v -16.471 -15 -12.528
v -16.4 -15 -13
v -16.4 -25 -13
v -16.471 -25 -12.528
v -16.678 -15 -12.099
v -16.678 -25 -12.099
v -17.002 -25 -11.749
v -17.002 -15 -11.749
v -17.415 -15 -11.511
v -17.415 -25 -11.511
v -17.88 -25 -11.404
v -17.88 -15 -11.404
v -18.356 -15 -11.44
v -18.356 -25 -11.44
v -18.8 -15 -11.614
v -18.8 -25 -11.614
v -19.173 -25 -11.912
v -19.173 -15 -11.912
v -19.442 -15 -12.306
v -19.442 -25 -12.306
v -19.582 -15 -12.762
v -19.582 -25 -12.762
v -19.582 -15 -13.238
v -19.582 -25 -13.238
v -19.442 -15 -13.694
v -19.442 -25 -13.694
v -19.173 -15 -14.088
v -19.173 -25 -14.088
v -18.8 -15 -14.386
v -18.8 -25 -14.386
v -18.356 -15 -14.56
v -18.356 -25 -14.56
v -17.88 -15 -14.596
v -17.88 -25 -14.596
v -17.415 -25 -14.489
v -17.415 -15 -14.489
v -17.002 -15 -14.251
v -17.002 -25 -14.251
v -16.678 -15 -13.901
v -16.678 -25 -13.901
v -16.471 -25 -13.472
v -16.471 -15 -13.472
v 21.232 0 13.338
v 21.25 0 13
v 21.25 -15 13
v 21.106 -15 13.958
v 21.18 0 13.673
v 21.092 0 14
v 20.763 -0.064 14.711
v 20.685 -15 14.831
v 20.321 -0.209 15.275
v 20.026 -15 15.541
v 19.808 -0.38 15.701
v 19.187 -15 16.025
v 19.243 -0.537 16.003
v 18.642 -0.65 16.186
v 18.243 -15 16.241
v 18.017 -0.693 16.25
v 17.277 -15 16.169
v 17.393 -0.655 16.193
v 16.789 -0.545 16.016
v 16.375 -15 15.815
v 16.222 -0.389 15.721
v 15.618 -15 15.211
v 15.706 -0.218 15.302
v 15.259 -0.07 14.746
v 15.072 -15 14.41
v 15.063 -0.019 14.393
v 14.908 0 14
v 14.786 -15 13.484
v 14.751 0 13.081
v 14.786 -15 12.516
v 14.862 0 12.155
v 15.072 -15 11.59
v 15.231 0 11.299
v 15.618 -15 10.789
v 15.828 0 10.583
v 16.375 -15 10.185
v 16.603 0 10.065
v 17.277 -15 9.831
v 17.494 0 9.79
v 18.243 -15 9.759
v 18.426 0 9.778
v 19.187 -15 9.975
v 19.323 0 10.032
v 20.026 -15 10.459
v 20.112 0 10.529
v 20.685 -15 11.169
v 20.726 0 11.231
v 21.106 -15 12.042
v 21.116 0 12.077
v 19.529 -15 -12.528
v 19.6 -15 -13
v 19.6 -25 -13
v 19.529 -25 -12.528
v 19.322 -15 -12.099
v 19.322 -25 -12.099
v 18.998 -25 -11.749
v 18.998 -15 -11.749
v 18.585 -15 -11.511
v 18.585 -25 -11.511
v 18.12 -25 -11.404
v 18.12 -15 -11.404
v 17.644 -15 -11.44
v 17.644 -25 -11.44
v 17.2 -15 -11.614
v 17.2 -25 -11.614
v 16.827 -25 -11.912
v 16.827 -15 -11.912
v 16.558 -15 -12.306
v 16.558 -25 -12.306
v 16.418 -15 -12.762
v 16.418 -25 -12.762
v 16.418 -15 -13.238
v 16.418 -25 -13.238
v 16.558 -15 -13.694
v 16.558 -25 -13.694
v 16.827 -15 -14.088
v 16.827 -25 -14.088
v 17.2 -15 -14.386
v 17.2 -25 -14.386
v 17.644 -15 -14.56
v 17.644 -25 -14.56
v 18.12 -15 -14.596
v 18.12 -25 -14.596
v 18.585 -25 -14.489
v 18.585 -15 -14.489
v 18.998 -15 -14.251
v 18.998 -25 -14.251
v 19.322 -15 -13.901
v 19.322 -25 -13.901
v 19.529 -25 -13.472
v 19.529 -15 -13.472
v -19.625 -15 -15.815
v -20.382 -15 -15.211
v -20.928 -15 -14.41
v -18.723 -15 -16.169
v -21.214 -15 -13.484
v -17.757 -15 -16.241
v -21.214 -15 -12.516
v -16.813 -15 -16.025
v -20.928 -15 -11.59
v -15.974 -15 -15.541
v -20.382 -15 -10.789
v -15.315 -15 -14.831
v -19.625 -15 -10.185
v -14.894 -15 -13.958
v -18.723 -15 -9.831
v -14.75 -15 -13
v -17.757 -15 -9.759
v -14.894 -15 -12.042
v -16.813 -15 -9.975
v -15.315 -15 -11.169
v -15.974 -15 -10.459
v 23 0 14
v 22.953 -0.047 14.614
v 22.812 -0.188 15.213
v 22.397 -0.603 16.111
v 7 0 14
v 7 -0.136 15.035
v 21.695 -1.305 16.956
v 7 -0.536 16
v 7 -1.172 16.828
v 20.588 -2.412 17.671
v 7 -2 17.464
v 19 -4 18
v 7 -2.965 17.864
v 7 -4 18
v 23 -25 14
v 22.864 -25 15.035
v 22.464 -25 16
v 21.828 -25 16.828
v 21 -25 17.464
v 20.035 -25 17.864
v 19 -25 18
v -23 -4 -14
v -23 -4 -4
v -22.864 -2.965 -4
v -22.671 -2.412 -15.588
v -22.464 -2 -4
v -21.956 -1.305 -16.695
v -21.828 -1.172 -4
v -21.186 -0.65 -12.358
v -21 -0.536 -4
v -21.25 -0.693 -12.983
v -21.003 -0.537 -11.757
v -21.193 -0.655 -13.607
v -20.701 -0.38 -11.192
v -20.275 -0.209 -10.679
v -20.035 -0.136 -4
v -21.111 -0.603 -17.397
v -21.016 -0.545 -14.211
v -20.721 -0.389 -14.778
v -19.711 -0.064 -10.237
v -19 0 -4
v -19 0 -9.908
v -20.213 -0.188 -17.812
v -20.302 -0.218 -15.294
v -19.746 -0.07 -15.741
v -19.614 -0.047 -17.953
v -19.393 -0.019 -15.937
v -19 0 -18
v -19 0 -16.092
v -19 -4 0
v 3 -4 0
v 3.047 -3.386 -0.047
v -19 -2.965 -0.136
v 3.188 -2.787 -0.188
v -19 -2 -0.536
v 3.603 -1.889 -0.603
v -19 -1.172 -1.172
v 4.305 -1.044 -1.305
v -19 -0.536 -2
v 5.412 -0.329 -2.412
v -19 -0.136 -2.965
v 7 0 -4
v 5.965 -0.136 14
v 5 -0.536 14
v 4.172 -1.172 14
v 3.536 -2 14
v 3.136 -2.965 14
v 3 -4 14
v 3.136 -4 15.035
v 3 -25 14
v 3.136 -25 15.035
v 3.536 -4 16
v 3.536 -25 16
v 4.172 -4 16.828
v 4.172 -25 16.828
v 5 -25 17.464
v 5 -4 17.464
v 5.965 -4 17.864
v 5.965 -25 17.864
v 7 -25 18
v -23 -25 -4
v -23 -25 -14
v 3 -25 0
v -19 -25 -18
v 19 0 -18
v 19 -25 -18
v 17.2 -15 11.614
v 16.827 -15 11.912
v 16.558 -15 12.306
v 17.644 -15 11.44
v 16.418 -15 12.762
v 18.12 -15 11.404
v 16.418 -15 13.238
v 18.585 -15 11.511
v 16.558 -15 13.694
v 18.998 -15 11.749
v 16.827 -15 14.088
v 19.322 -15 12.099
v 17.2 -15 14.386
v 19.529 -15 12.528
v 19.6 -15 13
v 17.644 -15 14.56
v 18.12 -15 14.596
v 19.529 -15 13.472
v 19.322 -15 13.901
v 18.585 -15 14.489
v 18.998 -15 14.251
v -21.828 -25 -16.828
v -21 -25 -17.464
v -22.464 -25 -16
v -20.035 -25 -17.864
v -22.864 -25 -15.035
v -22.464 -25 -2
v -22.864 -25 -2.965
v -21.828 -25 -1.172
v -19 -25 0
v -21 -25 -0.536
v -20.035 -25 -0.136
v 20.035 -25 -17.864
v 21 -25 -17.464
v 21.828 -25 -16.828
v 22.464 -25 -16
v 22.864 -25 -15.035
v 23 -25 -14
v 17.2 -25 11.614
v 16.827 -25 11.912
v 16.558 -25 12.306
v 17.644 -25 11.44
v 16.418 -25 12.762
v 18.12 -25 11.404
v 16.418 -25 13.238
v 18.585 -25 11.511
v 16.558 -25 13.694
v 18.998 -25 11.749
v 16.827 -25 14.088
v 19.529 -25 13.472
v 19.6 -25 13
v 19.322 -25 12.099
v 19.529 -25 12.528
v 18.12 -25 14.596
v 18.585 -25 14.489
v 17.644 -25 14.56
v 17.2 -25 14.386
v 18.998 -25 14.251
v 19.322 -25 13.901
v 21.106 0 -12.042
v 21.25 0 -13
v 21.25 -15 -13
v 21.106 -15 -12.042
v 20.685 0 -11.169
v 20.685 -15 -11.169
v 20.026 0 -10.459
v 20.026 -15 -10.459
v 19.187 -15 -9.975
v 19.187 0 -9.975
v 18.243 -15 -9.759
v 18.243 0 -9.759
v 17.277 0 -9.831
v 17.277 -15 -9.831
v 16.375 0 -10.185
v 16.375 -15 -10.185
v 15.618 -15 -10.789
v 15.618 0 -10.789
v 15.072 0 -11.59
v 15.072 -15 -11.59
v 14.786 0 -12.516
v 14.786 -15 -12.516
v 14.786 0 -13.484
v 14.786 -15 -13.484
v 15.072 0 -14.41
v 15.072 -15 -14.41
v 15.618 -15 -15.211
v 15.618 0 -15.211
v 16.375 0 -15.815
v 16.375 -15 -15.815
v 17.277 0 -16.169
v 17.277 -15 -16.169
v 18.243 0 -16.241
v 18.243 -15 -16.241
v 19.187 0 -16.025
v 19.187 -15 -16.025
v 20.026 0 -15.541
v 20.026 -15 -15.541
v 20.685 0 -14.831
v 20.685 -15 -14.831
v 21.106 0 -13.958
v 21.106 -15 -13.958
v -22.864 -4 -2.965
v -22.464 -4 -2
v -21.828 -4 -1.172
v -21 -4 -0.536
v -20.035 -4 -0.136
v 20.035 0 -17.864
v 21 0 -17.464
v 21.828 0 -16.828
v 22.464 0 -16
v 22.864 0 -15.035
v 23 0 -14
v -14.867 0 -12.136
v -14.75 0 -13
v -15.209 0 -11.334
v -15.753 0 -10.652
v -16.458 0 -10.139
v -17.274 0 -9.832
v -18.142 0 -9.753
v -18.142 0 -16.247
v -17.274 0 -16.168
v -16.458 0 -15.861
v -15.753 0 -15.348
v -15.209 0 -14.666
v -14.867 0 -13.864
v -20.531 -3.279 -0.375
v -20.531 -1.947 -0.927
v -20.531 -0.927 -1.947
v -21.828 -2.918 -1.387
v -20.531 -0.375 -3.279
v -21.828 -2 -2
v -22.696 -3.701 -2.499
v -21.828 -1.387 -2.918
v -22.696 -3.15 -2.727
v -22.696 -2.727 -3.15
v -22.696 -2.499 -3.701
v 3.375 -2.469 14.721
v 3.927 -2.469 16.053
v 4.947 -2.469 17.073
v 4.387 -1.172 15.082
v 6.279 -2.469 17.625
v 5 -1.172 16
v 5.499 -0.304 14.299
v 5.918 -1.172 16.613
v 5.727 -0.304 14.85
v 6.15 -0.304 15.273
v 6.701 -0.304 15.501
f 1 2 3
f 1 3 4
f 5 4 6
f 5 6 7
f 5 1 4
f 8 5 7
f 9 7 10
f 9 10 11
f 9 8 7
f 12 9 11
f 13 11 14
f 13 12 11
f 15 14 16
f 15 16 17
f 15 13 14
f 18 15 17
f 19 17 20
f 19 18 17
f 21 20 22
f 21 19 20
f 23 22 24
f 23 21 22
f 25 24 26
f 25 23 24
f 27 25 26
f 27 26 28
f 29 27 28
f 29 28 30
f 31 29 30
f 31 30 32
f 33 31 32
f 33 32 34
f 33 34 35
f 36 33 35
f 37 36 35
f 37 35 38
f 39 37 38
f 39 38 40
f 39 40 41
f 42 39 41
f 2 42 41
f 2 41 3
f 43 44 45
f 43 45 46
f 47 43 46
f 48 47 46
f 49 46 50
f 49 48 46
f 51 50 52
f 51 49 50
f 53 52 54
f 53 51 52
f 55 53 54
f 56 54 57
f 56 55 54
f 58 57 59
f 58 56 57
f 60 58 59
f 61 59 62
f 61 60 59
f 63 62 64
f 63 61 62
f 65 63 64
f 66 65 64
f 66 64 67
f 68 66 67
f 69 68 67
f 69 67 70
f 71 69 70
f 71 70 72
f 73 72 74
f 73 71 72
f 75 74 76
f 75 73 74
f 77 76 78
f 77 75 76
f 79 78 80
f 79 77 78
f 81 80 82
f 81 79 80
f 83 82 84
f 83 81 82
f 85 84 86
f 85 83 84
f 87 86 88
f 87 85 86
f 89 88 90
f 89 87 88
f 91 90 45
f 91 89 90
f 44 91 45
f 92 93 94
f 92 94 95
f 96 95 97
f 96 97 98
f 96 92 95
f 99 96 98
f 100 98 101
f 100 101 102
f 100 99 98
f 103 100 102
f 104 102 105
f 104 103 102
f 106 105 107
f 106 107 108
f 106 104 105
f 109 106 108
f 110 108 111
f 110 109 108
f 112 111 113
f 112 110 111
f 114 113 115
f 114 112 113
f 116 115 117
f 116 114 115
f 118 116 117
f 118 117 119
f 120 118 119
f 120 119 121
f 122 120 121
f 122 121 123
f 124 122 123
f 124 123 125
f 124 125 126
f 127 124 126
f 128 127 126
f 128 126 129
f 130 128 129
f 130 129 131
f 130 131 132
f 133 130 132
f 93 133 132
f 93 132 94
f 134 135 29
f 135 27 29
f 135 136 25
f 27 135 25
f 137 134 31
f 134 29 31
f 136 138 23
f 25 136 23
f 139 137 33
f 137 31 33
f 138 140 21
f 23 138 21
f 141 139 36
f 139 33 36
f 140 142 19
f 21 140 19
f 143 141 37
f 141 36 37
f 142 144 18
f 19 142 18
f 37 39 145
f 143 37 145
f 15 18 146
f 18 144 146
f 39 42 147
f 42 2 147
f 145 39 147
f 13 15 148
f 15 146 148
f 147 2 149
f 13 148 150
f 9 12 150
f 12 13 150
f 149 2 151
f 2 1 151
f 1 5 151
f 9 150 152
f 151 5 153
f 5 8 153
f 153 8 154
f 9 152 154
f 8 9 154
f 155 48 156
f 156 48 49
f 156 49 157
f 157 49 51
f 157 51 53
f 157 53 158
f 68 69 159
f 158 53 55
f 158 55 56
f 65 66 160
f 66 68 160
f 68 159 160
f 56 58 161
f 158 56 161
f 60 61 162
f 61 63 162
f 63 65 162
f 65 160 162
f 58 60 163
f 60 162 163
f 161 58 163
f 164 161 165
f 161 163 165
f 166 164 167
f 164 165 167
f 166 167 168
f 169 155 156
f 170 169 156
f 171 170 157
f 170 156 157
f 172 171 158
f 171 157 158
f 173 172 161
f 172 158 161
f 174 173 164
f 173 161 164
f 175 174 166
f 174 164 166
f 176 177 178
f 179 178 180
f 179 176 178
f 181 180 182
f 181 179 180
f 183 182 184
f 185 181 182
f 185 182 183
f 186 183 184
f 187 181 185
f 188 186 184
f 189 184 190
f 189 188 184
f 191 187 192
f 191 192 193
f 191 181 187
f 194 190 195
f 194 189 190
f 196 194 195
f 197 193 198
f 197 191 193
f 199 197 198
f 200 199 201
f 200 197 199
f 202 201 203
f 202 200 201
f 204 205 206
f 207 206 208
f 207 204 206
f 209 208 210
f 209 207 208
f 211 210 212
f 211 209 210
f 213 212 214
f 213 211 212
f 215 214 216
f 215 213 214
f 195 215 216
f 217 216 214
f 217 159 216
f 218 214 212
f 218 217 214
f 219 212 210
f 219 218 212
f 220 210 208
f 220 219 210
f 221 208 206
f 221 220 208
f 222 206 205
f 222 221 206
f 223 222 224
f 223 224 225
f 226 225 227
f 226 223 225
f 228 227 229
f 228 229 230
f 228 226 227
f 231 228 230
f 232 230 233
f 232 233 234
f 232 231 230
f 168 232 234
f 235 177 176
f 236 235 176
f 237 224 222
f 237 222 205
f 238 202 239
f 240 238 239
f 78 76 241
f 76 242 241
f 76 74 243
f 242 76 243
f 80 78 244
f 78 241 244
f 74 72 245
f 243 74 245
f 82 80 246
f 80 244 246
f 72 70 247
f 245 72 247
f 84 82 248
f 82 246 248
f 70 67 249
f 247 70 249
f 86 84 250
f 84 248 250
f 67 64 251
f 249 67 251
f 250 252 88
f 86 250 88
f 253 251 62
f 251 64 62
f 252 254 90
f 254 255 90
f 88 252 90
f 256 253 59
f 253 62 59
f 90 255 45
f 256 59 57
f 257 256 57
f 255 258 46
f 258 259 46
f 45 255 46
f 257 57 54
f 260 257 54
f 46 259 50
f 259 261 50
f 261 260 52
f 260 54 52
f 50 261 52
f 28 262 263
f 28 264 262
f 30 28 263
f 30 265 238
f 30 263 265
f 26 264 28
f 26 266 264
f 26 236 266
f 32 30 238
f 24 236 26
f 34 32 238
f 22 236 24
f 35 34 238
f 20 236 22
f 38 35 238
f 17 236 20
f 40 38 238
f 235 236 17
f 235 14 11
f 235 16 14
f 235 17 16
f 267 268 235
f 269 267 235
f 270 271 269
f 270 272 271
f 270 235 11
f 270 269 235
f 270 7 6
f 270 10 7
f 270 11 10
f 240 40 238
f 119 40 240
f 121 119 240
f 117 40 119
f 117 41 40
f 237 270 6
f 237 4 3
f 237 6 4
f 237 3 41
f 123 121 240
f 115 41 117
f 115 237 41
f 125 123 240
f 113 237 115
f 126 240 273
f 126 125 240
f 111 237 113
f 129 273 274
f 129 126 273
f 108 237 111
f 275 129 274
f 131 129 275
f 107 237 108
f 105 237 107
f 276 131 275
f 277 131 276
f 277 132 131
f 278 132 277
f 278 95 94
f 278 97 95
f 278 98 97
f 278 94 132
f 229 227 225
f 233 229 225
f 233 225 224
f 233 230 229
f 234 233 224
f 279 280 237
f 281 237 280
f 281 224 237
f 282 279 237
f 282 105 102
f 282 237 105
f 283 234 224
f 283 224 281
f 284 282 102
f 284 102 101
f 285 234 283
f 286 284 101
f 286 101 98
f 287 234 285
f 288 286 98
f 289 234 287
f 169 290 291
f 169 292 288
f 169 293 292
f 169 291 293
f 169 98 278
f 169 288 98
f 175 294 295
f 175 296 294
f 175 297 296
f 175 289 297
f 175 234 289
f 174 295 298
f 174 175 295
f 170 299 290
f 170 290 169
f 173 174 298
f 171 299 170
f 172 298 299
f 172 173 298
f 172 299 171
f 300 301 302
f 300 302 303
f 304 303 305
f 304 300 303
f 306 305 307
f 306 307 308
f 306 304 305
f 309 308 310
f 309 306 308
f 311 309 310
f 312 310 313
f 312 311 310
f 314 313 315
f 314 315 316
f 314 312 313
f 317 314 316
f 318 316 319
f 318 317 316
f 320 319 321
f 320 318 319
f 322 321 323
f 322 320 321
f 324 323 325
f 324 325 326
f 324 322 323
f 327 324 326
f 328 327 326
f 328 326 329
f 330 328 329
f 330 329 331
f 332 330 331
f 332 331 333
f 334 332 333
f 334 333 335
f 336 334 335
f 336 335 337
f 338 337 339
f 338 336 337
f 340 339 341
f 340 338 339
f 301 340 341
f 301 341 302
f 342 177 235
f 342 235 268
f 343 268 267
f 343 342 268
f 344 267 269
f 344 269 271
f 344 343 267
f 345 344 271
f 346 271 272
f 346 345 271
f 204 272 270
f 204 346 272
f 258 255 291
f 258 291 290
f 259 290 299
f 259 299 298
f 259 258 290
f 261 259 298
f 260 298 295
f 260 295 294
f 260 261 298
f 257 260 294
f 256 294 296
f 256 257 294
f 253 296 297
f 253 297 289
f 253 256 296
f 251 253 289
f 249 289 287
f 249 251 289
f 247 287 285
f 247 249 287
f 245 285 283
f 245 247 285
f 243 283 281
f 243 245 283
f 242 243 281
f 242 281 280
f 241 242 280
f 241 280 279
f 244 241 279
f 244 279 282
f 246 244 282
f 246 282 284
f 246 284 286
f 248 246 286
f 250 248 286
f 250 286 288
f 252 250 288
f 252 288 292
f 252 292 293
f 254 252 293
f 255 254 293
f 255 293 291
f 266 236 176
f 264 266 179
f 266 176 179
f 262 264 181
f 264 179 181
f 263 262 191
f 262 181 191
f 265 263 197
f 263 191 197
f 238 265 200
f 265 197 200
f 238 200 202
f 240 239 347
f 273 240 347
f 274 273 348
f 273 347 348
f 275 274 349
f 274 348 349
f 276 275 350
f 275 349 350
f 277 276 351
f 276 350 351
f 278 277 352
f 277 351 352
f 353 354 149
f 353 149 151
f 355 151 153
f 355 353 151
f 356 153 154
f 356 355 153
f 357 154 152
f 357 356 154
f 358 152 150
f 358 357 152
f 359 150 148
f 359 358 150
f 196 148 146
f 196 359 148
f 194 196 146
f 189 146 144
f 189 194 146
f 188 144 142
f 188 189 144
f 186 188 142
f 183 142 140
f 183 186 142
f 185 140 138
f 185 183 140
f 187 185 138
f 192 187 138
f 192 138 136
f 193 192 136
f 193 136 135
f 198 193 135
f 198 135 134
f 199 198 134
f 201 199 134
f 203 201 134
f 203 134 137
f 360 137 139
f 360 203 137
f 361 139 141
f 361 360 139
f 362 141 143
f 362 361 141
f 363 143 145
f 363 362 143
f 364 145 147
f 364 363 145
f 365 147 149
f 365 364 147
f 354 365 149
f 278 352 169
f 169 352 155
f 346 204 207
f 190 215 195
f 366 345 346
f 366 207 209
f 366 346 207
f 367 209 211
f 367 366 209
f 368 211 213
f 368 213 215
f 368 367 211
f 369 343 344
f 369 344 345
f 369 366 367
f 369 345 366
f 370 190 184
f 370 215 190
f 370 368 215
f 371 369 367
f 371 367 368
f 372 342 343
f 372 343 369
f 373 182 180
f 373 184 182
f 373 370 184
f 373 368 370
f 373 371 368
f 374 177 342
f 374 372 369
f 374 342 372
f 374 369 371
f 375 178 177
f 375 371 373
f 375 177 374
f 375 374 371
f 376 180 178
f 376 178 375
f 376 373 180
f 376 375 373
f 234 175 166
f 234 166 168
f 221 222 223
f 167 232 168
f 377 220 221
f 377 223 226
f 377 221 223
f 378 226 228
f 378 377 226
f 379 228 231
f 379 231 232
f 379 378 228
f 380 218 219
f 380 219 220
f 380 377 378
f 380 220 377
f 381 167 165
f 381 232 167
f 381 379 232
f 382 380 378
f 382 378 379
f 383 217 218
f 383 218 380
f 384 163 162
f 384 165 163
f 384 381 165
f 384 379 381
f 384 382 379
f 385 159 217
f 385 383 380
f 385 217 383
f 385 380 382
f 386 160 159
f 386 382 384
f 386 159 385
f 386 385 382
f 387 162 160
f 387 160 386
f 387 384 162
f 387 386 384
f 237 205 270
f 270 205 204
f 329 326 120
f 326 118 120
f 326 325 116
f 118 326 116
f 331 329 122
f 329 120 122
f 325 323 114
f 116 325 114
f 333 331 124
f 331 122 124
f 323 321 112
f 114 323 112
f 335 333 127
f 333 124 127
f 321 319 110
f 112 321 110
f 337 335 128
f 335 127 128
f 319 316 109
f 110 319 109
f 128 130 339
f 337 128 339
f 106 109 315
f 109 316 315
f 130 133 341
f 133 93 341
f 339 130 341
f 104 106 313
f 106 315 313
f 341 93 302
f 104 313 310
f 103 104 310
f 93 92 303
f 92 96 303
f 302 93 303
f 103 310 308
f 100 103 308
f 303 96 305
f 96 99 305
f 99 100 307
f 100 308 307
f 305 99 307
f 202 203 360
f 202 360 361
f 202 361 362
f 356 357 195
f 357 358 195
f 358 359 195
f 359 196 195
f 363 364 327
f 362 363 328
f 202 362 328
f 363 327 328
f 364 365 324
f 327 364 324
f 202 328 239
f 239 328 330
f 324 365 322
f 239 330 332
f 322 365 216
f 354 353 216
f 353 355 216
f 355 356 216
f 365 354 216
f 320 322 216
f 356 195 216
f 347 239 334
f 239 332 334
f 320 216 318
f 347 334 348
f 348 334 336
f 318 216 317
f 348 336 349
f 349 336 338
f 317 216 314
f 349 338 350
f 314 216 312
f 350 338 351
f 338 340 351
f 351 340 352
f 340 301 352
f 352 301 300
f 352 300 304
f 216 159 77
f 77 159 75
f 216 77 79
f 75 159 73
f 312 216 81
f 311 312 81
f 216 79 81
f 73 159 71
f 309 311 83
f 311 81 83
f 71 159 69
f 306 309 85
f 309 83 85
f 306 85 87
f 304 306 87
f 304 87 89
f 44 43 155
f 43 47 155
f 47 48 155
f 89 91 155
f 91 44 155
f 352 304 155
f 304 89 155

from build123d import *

# Parameters (mm, degrees)
F0_R         = 3.25
F0_R_2       = 1.6
F1_DEPTH     = 25
F2_DEPTH     = 15
F3_T1_DEPTH  = 24
F3_T3_DEPTH  = 22
F3_T5_DEPTH  = 14
F3_T7_DEPTH  = 26
F3_T9_DEPTH  = 31
F3_T11_DEPTH = 45
F3_S15_W     = 4
F3_S15_H     = 4
F3_T16_DEPTH = 4
F3_S21_W     = 4
F3_S21_H     = 4
F3_T22_DEPTH = 4
F3_T29_DEPTH = 32
F3_T33_DEPTH = 24


# Not quite as in the source:
# - a fillet or chamfer that OpenCascade refuses, or shapes differently, is made with other operations: its cross-section is extruded or revolved along the edge and cut away or added


with BuildPart() as f1:
    # F0 (on Front) → F1 (new body)
    with BuildSketch(Plane.XZ):
        Polygon((-23, 0), (-23, -18), (23, -18), (23, 18), (3, 18), (3, 0), align=None)
        with Locations((-18, -13)):
            Circle(F0_R, mode=Mode.SUBTRACT)
        with Locations((18, -13)):
            Circle(F0_R, mode=Mode.SUBTRACT)
        with Locations((18, 13)):
            Circle(F0_R, mode=Mode.SUBTRACT)
        with Locations((18, 13)):
            Circle(F0_R)
        with Locations((18, 13)):
            Circle(F0_R_2, mode=Mode.SUBTRACT)
        with Locations((18, -13)):
            Circle(F0_R)
        with Locations((18, -13)):
            Circle(F0_R_2, mode=Mode.SUBTRACT)
        with Locations((-18, -13)):
            Circle(F0_R)
        with Locations((-18, -13)):
            Circle(F0_R_2, mode=Mode.SUBTRACT)
    extrude(amount=F1_DEPTH)

    # F0 (on Front) → F2 (cut)
    with BuildSketch(Plane.XZ):
        with Locations((18, -13)):
            Circle(F0_R)
        with Locations((18, -13)):
            Circle(F0_R_2, mode=Mode.SUBTRACT)
        with Locations((-18, -13)):
            Circle(F0_R)
        with Locations((-18, -13)):
            Circle(F0_R_2, mode=Mode.SUBTRACT)
        with Locations((18, 13)):
            Circle(F0_R)
        with Locations((18, 13)):
            Circle(F0_R_2, mode=Mode.SUBTRACT)
    extrude(amount=F2_DEPTH, mode=Mode.SUBTRACT)

    # F3: fillet of radius 4 on 9 edges, made by hand

    # F3_s2 → F3_t1 (cut)
    with BuildSketch(Plane.XY.offset(-28)):
        with BuildLine():
            ThreePointArc((-23, -4), (-21.8284271247, -1.1715728753), (-19, 0))
            Line((-19, 0), (-23, 0))
            Line((-23, 0), (-23, -4))
        make_face()
    extrude(amount=F3_T1_DEPTH, mode=Mode.SUBTRACT)

    # F3_s4 → F3_t3 (cut)
    with BuildSketch(Plane.YZ.offset(-19)):
        with BuildLine():
            ThreePointArc((-4, 0), (-1.1715728753, -1.1715728753), (0, -4))
            Line((0, -4), (0, 0))
            Line((0, 0), (-4, 0))
        make_face()
    extrude(amount=F3_T3_DEPTH, mode=Mode.SUBTRACT)

    # F3_s6 → F3_t5 (cut)
    with BuildSketch(Plane.XY):
        with BuildLine():
            ThreePointArc((7, 0), (4.1715728753, -1.1715728753), (3, -4))
            Line((3, -4), (3, 0))
            Line((3, 0), (7, 0))
        make_face()
    extrude(amount=F3_T5_DEPTH, mode=Mode.SUBTRACT)

    # F3_s8 → F3_t7 (cut)
    with BuildSketch(Plane.YZ.offset(7)):
        with BuildLine():
            ThreePointArc((0, 14), (-1.1715728753, 16.8284271247), (-4, 18))
            Line((-4, 18), (0, 18))
            Line((0, 18), (0, 14))
        make_face()
    extrude(amount=F3_T7_DEPTH, mode=Mode.SUBTRACT)

    # F3_s10 → F3_t9 (cut)
    with BuildSketch(Plane.XZ.offset(4)):
        with BuildLine():
            ThreePointArc((-23, -4), (-21.8284271247, -1.1715728753), (-19, 0))
            Line((-19, 0), (-23, 0))
            Line((-23, 0), (-23, -4))
        make_face()
        with BuildLine():
            ThreePointArc((3, 14), (4.1715728753, 16.8284271247), (7, 18))
            Line((7, 18), (3, 18))
            Line((3, 18), (3, 14))
        make_face()
    extrude(amount=F3_T9_DEPTH, mode=Mode.SUBTRACT)

    # F3_s12 → F3_t11 (cut)
    with BuildSketch(Plane.XZ.offset(-10)):
        with BuildLine():
            ThreePointArc((-23, -14), (-21.8284271247, -16.8284271247), (-19, -18))
            Line((-19, -18), (-23, -18))
            Line((-23, -18), (-23, -14))
        make_face()
        with BuildLine():
            ThreePointArc((19, -18), (21.8284271247, -16.8284271247), (23, -14))
            Line((23, -14), (23, -18))
            Line((23, -18), (19, -18))
        make_face()
        with BuildLine():
            ThreePointArc((23, 14), (21.8284271247, 16.8284271247), (19, 18))
            Line((19, 18), (23, 18))
            Line((23, 18), (23, 14))
        make_face()
    extrude(amount=F3_T11_DEPTH, mode=Mode.SUBTRACT)


with BuildPart() as f3_tool14:
    # F3_s15 → F3_t16 (new body)
    with BuildSketch(Plane.YZ.offset(-19)):
        with Locations((-2, -2)):
            Rectangle(F3_S15_W, F3_S15_H)
    extrude(amount=-F3_T16_DEPTH)

    # F3_s17 → F3_t18 (revolve, cut)
    with BuildSketch(Plane(origin=(-19, -4, -4), x_dir=(0, -0.7071067812, -0.7071067812), z_dir=(0, 0.7071067812, -0.7071067812))):
        with BuildLine():
            ThreePointArc((0, -4), (4, 0), (0, 4))
            Line((0, 4), (0, -4))
        make_face()
    revolve(axis=Axis((-19, -4, -4), (-1, 0, 0)), mode=Mode.SUBTRACT)


with BuildPart() as f1_1:
    add(f1.part)

    # F3_t13: cut F3_tool14
    add(f3_tool14.part, mode=Mode.SUBTRACT)


with BuildPart() as f3_tool20:
    # F3_s21 → F3_t22 (new body)
    with BuildSketch(Plane.XZ.offset(4)):
        with Locations((5, 16)):
            Rectangle(F3_S21_W, F3_S21_H)
    extrude(amount=-F3_T22_DEPTH)

    # F3_s23 → F3_t24 (revolve, cut)
    with BuildSketch(Plane(origin=(7, -4, 14), x_dir=(0.7071067812, 0, -0.7071067812), z_dir=(0.7071067812, 0, 0.7071067812))):
        with BuildLine():
            ThreePointArc((0, -4), (4, 0), (0, 4))
            Line((0, 4), (0, -4))
        make_face()
    revolve(axis=Axis((7, -4, 14), (0, 1, 0)), mode=Mode.SUBTRACT)


with BuildPart() as f1_2:
    add(f1_1.part)

    # F3_t19: cut F3_tool20
    add(f3_tool20.part, mode=Mode.SUBTRACT)


with BuildPart() as f3_tool27:
    # F3_s28 → F3_t29 (new body)
    with BuildSketch(Plane.YZ.offset(13)):
        with BuildLine():
            ThreePointArc((-4, 0), (-1.1715728753, -1.1715728753), (0, -4))
            Line((0, -4), (0, 0))
            Line((0, 0), (-4, 0))
        make_face()
    extrude(amount=-F3_T29_DEPTH)

    split(bisect_by=Plane.YZ.offset(3), keep=Keep.TOP)


with BuildPart() as f3_tool31:
    # F3_s32 → F3_t33 (new body)
    with BuildSketch(Plane.XY.offset(14)):
        with BuildLine():
            ThreePointArc((7, 0), (4.1715728753, -1.1715728753), (3, -4))
            Line((3, -4), (3, 0))
            Line((3, 0), (7, 0))
        make_face()
    extrude(amount=-F3_T33_DEPTH)

    split(bisect_by=Plane.XY, keep=Keep.BOTTOM)


with BuildPart() as f3_tool27_1:
    add(f3_tool27.part)

    # F3_t35: intersect F3_tool31
    add(f3_tool31.part, mode=Mode.INTERSECT)


with BuildPart() as f1_3:
    add(f1_2.part)

    # F3_t25: cut F3_tool27
    add(f3_tool27_1.part, mode=Mode.SUBTRACT)


solid = f1_3.part
